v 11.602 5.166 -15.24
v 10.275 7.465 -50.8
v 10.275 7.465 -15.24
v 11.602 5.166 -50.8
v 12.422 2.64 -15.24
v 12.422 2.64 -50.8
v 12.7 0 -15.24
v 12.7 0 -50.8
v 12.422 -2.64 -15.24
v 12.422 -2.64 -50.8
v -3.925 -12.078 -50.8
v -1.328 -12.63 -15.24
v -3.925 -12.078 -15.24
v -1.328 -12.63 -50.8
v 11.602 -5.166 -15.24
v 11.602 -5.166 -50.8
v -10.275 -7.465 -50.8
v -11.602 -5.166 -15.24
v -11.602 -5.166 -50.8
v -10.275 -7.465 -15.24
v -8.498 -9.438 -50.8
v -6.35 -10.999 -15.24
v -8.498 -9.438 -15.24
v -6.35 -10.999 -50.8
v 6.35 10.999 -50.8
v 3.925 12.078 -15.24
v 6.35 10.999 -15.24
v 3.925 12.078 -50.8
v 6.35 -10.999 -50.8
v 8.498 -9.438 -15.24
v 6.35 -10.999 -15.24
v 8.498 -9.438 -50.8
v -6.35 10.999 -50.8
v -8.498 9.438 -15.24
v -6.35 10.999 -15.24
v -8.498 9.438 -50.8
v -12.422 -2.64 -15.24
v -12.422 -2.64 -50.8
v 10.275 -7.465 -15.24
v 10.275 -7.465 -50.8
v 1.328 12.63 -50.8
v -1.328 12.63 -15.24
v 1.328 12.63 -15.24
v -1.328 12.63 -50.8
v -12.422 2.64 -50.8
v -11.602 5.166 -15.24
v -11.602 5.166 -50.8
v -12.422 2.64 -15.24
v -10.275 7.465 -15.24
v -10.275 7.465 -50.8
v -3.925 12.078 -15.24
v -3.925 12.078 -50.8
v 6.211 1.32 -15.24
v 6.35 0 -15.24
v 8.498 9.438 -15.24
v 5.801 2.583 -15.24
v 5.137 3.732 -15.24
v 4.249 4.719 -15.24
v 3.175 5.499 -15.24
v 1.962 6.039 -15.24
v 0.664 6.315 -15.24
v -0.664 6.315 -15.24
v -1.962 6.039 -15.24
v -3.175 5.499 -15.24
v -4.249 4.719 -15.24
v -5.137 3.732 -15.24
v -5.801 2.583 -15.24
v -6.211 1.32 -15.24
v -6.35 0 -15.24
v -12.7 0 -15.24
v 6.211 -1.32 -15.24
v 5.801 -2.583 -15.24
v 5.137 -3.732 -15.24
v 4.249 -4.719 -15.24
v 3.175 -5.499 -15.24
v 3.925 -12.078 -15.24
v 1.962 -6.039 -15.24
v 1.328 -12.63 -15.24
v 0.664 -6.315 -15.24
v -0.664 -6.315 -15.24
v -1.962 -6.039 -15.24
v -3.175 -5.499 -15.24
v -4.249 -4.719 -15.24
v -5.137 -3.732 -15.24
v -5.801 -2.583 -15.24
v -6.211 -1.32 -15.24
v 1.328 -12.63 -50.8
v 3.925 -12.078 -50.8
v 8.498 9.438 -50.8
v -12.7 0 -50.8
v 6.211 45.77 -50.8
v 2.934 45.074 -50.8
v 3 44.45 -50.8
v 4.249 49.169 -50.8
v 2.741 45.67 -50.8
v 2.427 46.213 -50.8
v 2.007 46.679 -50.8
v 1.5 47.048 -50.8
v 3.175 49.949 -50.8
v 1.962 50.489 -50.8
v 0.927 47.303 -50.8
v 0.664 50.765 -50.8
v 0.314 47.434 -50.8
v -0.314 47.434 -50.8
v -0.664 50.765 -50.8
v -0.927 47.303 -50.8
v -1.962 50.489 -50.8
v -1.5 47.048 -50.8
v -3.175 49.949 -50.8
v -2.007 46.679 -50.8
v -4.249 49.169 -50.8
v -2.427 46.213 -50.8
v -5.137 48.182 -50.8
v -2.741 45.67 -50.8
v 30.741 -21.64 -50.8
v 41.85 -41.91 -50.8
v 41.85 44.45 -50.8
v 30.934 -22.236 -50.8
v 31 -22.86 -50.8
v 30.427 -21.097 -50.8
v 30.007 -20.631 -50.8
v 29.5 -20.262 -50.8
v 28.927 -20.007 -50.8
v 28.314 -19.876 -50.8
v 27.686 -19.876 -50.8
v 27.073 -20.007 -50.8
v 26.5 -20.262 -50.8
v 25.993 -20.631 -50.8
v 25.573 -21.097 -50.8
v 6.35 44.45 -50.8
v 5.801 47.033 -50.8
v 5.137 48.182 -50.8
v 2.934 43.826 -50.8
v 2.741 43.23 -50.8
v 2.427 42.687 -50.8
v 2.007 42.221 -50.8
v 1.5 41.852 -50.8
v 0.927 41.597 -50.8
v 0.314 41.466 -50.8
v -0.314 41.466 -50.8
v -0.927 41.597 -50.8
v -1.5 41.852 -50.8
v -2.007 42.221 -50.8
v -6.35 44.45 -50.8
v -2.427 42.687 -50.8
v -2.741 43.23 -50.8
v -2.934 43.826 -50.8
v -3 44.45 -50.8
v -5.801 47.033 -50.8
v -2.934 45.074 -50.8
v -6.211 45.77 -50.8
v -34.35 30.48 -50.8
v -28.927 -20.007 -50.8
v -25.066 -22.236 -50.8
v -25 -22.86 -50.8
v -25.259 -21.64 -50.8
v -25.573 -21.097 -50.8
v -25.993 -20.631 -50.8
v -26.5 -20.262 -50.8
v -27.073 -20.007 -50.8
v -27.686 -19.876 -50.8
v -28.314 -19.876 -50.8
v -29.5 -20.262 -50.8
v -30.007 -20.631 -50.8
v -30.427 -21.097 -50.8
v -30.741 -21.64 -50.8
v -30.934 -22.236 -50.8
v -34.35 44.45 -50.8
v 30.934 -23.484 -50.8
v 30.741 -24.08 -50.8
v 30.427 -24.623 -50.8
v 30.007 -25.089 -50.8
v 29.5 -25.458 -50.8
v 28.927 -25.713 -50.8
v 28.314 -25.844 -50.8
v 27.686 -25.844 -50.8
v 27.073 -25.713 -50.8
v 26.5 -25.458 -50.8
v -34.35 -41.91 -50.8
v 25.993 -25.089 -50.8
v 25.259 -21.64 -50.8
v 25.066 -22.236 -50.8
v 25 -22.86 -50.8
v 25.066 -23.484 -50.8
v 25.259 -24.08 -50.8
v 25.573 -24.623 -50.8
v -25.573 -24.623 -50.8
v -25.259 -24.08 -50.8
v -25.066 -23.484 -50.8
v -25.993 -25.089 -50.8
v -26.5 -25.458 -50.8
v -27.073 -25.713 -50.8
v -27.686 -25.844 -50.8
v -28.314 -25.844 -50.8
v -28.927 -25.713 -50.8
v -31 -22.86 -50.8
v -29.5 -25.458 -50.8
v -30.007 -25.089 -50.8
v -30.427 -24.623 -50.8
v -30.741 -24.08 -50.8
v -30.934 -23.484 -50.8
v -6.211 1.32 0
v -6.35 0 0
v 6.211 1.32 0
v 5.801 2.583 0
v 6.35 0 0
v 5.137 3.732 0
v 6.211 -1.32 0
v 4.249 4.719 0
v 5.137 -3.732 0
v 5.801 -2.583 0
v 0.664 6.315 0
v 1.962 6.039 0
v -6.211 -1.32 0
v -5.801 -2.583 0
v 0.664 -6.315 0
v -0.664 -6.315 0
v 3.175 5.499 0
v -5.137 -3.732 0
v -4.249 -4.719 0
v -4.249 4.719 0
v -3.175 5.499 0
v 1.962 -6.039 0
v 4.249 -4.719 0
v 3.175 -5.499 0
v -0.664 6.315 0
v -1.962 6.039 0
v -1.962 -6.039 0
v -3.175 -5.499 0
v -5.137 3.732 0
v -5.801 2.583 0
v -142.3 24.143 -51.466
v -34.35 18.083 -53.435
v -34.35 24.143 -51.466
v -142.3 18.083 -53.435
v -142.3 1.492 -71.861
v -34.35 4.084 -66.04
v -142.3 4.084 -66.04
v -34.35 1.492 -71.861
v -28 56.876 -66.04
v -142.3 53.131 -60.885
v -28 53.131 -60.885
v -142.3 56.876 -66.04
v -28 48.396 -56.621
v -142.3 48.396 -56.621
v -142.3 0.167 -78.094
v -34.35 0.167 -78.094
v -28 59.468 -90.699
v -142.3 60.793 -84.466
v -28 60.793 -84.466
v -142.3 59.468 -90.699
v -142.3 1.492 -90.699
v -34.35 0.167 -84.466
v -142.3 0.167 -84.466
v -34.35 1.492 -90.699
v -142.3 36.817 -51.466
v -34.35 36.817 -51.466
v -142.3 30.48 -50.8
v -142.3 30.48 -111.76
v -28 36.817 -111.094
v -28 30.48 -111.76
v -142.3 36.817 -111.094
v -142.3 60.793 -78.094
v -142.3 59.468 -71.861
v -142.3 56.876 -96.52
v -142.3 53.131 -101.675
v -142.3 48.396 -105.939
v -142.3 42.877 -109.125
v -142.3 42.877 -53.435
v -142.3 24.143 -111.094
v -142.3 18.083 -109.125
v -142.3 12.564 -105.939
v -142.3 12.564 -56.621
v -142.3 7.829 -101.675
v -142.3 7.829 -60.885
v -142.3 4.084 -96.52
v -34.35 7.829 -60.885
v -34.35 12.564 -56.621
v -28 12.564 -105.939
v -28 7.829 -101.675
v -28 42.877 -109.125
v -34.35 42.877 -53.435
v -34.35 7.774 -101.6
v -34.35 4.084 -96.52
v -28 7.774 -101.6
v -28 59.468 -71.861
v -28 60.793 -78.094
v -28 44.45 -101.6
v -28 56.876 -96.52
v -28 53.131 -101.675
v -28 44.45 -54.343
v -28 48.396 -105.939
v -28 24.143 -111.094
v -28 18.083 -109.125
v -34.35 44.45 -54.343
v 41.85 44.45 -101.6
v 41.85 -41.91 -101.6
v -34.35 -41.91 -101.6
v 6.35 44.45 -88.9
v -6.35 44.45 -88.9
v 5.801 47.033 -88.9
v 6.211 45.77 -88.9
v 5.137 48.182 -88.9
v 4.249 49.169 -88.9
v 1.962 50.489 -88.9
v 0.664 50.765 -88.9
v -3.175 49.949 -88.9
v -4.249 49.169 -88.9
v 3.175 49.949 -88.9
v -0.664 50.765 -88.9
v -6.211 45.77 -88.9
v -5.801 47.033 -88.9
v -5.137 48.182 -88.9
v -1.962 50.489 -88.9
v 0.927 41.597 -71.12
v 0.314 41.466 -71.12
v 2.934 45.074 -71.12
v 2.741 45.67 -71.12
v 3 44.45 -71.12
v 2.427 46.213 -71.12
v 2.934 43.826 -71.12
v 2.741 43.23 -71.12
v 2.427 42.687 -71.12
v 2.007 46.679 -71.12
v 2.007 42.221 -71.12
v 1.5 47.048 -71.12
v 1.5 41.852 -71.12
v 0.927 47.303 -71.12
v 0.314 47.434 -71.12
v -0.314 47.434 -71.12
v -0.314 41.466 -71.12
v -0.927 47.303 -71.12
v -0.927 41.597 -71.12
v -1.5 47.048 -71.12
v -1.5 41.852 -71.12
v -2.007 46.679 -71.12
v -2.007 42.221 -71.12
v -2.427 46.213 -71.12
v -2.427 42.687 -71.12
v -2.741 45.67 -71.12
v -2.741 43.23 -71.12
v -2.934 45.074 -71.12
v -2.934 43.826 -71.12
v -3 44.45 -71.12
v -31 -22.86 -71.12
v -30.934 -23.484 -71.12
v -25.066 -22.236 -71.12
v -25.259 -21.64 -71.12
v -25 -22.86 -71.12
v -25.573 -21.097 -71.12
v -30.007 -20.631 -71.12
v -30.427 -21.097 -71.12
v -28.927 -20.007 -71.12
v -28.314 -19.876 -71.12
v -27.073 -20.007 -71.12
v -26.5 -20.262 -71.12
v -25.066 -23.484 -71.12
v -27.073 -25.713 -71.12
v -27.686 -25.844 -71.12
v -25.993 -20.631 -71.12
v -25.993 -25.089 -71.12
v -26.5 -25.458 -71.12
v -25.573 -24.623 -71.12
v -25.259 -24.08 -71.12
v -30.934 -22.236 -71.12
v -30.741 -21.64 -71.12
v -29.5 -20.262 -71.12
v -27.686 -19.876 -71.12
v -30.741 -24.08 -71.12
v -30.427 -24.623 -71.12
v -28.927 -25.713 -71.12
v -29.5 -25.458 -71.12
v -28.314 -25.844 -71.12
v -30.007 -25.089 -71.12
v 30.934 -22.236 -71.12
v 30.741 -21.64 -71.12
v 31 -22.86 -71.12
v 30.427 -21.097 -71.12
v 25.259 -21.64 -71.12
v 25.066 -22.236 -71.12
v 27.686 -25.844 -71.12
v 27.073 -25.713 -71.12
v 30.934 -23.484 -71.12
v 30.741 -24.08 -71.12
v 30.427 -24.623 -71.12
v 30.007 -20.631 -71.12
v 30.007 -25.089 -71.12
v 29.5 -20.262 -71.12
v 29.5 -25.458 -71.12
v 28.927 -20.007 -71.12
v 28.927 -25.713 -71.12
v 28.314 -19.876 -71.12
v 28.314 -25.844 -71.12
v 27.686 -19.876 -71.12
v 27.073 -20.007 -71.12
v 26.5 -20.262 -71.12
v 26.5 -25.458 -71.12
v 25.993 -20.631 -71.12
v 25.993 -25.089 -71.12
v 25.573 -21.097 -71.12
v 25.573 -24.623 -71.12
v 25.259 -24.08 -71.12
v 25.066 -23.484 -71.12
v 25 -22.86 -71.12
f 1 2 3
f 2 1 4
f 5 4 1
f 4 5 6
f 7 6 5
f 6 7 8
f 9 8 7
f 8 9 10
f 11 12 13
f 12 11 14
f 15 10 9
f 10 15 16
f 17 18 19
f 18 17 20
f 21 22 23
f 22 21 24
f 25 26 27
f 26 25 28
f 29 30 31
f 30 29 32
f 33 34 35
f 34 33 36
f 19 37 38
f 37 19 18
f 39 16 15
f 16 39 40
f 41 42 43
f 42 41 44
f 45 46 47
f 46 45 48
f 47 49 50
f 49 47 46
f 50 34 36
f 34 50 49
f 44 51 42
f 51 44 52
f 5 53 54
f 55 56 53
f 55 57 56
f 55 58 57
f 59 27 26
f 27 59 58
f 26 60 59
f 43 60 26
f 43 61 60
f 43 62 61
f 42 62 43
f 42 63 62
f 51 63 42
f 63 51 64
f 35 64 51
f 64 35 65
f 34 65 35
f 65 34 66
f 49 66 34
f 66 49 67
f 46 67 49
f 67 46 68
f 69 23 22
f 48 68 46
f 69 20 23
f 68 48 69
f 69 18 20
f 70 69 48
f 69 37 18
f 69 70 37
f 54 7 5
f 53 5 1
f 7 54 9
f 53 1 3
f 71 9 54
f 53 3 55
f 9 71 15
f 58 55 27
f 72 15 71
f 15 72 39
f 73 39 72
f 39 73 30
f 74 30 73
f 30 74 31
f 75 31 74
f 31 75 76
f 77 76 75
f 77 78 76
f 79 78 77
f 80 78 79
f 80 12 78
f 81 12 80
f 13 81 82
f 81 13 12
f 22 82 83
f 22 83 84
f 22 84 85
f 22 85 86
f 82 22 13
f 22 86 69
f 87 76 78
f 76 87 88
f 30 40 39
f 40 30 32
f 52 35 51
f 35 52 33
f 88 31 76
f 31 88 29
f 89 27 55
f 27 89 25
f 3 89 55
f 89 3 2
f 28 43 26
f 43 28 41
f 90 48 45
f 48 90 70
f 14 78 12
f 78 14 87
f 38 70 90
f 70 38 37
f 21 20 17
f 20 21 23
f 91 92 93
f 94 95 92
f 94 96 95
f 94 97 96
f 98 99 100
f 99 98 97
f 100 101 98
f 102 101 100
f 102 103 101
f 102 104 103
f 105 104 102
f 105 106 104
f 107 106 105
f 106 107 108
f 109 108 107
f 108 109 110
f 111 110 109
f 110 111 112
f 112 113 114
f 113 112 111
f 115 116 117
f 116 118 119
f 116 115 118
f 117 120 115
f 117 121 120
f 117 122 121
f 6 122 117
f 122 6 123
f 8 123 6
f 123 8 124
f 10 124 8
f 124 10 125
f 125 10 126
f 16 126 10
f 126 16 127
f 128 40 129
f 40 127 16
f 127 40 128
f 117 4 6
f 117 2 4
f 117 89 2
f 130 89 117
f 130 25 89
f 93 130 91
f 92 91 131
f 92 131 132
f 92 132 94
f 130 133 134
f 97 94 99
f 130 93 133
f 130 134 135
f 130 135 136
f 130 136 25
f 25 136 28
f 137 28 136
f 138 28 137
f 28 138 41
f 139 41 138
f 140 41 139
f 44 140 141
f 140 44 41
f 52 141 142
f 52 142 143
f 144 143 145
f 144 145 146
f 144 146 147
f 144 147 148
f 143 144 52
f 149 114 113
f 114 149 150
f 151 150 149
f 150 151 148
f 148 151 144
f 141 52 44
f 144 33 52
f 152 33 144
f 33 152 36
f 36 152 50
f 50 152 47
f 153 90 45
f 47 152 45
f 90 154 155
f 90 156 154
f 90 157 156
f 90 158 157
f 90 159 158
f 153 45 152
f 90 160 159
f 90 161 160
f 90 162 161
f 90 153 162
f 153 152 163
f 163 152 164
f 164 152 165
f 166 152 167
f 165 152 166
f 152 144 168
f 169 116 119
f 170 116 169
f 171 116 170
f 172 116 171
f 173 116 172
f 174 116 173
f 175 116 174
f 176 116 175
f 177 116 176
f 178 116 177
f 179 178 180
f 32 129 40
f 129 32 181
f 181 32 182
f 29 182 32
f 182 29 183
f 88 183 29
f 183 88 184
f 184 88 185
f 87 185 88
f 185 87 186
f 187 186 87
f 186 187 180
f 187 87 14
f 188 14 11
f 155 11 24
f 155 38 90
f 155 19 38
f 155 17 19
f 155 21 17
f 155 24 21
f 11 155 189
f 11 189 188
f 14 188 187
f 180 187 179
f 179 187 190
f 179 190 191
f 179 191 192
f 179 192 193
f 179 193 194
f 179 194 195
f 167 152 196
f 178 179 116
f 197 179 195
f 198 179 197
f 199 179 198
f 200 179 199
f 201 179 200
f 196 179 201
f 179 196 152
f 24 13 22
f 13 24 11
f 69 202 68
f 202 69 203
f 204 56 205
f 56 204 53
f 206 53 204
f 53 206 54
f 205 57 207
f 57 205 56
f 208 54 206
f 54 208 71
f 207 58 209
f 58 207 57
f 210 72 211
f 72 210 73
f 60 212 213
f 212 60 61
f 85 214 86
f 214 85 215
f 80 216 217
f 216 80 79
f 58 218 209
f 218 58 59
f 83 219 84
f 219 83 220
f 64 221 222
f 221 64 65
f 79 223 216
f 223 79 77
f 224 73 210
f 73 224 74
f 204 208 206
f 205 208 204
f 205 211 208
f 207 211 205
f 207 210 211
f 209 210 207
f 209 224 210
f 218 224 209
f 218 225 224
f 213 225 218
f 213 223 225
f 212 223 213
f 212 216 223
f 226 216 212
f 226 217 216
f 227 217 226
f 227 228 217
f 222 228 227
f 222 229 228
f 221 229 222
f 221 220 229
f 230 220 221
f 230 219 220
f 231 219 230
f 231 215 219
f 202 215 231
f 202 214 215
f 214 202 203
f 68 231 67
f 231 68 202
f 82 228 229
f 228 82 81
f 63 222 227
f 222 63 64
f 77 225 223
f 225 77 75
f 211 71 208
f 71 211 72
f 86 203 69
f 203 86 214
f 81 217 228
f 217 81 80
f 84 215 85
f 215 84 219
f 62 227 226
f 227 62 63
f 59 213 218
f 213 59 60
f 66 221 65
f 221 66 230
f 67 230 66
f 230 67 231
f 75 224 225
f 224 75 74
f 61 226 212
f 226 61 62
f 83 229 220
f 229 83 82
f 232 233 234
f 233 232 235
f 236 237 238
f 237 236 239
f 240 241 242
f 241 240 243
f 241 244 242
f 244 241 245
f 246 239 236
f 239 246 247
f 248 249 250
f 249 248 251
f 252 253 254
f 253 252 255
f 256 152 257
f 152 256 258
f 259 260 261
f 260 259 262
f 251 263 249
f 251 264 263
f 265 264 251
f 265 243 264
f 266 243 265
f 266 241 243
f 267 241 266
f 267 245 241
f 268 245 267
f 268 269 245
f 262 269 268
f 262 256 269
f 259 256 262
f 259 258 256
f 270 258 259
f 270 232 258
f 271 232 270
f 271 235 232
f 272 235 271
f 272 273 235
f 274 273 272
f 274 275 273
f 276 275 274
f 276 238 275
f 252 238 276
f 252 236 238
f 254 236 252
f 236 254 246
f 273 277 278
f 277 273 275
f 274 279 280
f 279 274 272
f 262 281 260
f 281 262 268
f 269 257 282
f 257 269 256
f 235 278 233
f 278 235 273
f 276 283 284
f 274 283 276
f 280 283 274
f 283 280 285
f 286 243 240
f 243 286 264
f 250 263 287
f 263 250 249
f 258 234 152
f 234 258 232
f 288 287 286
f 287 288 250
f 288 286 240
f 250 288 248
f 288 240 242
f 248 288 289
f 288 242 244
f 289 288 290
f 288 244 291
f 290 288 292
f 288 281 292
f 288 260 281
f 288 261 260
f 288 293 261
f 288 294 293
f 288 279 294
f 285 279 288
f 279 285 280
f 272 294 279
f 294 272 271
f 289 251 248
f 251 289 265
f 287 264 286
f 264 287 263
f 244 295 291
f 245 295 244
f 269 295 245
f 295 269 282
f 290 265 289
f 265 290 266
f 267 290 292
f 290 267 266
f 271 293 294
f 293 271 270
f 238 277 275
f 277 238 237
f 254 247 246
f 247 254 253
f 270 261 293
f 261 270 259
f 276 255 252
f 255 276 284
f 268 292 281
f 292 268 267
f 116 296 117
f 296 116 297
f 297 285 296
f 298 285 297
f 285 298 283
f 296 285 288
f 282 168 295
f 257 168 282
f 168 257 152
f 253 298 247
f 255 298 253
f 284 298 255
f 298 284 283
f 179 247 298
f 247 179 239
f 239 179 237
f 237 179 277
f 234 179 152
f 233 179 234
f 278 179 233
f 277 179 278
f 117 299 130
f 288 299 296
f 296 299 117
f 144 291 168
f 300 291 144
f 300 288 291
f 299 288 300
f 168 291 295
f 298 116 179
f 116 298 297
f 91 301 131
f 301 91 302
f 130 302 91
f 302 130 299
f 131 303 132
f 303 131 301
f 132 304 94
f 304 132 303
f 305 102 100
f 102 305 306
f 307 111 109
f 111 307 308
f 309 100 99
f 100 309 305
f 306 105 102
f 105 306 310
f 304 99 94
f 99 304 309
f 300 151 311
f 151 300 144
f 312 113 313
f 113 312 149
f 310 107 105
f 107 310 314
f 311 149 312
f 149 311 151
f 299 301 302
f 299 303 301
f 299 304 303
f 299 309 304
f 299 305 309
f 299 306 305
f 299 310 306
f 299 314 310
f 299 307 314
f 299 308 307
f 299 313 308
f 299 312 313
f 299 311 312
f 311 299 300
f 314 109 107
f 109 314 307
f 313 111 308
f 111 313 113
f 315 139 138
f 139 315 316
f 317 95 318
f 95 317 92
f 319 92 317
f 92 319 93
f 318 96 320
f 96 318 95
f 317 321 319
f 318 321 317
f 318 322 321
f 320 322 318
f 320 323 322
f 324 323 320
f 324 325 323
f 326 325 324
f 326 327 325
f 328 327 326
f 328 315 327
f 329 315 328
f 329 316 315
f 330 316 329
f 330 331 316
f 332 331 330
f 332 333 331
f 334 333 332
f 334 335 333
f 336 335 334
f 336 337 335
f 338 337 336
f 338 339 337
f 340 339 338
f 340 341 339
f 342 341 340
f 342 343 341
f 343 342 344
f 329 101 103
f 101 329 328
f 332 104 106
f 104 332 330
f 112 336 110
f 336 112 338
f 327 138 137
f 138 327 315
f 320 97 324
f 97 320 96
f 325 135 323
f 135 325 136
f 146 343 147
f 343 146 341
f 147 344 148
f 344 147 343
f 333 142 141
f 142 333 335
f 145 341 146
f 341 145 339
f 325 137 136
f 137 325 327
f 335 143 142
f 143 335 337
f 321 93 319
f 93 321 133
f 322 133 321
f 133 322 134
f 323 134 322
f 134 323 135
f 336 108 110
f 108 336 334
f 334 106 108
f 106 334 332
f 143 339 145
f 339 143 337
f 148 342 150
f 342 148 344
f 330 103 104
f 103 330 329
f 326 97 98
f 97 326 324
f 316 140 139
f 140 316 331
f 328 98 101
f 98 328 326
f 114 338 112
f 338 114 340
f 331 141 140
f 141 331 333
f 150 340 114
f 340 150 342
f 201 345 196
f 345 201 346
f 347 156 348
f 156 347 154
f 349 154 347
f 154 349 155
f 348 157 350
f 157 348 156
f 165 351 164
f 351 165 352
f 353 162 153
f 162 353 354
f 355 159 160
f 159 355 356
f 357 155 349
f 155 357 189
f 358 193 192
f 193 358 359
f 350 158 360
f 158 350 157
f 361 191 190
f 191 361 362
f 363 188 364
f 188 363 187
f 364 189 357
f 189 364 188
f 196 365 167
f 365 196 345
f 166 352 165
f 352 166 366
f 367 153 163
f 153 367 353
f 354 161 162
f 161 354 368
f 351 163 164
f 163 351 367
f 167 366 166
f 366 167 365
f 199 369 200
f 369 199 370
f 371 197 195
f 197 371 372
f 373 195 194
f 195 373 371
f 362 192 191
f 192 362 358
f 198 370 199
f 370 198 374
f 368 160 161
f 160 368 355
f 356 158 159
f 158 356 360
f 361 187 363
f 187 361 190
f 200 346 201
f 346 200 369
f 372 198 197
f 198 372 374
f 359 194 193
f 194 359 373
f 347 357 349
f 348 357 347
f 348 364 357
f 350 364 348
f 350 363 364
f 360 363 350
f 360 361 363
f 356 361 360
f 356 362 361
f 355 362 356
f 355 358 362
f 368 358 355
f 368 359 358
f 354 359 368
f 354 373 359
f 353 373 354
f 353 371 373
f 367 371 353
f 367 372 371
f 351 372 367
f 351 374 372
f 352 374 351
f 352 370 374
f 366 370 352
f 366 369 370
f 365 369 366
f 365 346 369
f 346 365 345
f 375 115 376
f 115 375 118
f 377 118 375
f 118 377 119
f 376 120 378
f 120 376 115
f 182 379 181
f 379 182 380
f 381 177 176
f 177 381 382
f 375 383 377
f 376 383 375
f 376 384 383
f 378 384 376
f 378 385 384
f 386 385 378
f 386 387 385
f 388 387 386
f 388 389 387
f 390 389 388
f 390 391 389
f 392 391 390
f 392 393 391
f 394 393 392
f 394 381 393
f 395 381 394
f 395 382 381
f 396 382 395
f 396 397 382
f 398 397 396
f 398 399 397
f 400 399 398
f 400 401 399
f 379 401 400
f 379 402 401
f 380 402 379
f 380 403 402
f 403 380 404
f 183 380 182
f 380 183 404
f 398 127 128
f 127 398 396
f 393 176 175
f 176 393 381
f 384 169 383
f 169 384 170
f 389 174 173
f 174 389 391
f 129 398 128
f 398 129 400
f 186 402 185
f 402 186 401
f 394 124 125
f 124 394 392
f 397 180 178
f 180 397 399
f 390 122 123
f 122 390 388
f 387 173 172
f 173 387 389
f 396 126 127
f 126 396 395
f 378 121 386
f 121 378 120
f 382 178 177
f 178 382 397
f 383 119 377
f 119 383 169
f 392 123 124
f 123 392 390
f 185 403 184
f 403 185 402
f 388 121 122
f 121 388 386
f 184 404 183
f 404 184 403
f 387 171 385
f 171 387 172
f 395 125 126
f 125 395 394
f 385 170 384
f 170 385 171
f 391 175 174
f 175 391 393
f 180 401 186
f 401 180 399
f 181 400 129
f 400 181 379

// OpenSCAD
$fn=30;
PI = 3.14159;

MM_PER_INCH = 25.4;


motor_short_c_c = 56;
motor_short_offset = 0.9 * MM_PER_INCH;
motor_long_c_c = 72;
motor_long_offset = 1.75 * MM_PER_INCH;
motor_collar_or = 1 * MM_PER_INCH / 2;
motor_hole_ir = 3;
motor_post_or = 0.5 * MM_PER_INCH / 2;
motor_hole_depth = 0.8 * MM_PER_INCH;
motor_post_depth = 1.5 * MM_PER_INCH;
motor_collar_h = 1.4 * MM_PER_INCH;
motor_post_to_sprocket_h = 2.0 * MM_PER_INCH;
motor_shaft_or = 0.5 * MM_PER_INCH / 2;
motor_or = 2.4 * MM_PER_INCH / 2;
motor_depth = 4.5 * MM_PER_INCH;
motor_gearbox_w = 3 * MM_PER_INCH;
motor_gearbox_depth = 2 * MM_PER_INCH;
motor_gearbox_l = 3.4 * MM_PER_INCH;
motor_sprocket_h = 0.3 * MM_PER_INCH;
motor_sprocket_or = 1.8 * MM_PER_INCH / 2;

function get_motor_tall_rotation() = atan(motor_short_c_c/2 / (motor_short_offset + motor_long_offset));

module motor_post() {
    // difference() {
      //  cylinder(h=motor_post_depth, r=motor_post_or);
       translate([0, 0, motor_post_depth - motor_hole_depth])
            cylinder(r=motor_hole_ir, h=motor_hole_depth*2);
    //}
}

module motor_shaft() {
    // TODO: model D-shaft
    cylinder(r=motor_shaft_or, h=motor_post_to_sprocket_h);
}
// ! motor_shaft();

module drive_motor(use_stl=false) {
    if (use_stl) {
        import("drive_motor.stl");
    } else {
        translate([0, 0, -motor_post_to_sprocket_h]) {
            difference() {
                union() {
                    cylinder(r=motor_collar_or, h=motor_collar_h);
                    
                    *# cylinder(r=motor_shaft_or, h=motor_post_to_sprocket_h);
                    # motor_shaft();

                    translate([-motor_short_c_c/2, motor_or, -motor_or])
                    rotate([0, -90, 0])
                        cylinder(r=motor_or, h=motor_depth);
                    translate([-motor_short_c_c/2 - motor_post_or, motor_long_offset - motor_gearbox_l, -motor_gearbox_depth])
                    cube([motor_gearbox_w, motor_gearbox_l, motor_gearbox_depth]);
                    translate([0, motor_long_offset, -motor_post_depth])
                        cylinder(h=motor_post_depth, r=motor_post_or);
                }
                translate([0, motor_long_offset, -motor_post_depth])
                    motor_post();
                translate([-motor_short_c_c/2, -motor_short_offset, -motor_post_depth])
                    motor_post();
                translate([motor_short_c_c/2, -motor_short_offset, -motor_post_depth])
                    motor_post();
            }
        }
    }
}

drive_motor(false);
